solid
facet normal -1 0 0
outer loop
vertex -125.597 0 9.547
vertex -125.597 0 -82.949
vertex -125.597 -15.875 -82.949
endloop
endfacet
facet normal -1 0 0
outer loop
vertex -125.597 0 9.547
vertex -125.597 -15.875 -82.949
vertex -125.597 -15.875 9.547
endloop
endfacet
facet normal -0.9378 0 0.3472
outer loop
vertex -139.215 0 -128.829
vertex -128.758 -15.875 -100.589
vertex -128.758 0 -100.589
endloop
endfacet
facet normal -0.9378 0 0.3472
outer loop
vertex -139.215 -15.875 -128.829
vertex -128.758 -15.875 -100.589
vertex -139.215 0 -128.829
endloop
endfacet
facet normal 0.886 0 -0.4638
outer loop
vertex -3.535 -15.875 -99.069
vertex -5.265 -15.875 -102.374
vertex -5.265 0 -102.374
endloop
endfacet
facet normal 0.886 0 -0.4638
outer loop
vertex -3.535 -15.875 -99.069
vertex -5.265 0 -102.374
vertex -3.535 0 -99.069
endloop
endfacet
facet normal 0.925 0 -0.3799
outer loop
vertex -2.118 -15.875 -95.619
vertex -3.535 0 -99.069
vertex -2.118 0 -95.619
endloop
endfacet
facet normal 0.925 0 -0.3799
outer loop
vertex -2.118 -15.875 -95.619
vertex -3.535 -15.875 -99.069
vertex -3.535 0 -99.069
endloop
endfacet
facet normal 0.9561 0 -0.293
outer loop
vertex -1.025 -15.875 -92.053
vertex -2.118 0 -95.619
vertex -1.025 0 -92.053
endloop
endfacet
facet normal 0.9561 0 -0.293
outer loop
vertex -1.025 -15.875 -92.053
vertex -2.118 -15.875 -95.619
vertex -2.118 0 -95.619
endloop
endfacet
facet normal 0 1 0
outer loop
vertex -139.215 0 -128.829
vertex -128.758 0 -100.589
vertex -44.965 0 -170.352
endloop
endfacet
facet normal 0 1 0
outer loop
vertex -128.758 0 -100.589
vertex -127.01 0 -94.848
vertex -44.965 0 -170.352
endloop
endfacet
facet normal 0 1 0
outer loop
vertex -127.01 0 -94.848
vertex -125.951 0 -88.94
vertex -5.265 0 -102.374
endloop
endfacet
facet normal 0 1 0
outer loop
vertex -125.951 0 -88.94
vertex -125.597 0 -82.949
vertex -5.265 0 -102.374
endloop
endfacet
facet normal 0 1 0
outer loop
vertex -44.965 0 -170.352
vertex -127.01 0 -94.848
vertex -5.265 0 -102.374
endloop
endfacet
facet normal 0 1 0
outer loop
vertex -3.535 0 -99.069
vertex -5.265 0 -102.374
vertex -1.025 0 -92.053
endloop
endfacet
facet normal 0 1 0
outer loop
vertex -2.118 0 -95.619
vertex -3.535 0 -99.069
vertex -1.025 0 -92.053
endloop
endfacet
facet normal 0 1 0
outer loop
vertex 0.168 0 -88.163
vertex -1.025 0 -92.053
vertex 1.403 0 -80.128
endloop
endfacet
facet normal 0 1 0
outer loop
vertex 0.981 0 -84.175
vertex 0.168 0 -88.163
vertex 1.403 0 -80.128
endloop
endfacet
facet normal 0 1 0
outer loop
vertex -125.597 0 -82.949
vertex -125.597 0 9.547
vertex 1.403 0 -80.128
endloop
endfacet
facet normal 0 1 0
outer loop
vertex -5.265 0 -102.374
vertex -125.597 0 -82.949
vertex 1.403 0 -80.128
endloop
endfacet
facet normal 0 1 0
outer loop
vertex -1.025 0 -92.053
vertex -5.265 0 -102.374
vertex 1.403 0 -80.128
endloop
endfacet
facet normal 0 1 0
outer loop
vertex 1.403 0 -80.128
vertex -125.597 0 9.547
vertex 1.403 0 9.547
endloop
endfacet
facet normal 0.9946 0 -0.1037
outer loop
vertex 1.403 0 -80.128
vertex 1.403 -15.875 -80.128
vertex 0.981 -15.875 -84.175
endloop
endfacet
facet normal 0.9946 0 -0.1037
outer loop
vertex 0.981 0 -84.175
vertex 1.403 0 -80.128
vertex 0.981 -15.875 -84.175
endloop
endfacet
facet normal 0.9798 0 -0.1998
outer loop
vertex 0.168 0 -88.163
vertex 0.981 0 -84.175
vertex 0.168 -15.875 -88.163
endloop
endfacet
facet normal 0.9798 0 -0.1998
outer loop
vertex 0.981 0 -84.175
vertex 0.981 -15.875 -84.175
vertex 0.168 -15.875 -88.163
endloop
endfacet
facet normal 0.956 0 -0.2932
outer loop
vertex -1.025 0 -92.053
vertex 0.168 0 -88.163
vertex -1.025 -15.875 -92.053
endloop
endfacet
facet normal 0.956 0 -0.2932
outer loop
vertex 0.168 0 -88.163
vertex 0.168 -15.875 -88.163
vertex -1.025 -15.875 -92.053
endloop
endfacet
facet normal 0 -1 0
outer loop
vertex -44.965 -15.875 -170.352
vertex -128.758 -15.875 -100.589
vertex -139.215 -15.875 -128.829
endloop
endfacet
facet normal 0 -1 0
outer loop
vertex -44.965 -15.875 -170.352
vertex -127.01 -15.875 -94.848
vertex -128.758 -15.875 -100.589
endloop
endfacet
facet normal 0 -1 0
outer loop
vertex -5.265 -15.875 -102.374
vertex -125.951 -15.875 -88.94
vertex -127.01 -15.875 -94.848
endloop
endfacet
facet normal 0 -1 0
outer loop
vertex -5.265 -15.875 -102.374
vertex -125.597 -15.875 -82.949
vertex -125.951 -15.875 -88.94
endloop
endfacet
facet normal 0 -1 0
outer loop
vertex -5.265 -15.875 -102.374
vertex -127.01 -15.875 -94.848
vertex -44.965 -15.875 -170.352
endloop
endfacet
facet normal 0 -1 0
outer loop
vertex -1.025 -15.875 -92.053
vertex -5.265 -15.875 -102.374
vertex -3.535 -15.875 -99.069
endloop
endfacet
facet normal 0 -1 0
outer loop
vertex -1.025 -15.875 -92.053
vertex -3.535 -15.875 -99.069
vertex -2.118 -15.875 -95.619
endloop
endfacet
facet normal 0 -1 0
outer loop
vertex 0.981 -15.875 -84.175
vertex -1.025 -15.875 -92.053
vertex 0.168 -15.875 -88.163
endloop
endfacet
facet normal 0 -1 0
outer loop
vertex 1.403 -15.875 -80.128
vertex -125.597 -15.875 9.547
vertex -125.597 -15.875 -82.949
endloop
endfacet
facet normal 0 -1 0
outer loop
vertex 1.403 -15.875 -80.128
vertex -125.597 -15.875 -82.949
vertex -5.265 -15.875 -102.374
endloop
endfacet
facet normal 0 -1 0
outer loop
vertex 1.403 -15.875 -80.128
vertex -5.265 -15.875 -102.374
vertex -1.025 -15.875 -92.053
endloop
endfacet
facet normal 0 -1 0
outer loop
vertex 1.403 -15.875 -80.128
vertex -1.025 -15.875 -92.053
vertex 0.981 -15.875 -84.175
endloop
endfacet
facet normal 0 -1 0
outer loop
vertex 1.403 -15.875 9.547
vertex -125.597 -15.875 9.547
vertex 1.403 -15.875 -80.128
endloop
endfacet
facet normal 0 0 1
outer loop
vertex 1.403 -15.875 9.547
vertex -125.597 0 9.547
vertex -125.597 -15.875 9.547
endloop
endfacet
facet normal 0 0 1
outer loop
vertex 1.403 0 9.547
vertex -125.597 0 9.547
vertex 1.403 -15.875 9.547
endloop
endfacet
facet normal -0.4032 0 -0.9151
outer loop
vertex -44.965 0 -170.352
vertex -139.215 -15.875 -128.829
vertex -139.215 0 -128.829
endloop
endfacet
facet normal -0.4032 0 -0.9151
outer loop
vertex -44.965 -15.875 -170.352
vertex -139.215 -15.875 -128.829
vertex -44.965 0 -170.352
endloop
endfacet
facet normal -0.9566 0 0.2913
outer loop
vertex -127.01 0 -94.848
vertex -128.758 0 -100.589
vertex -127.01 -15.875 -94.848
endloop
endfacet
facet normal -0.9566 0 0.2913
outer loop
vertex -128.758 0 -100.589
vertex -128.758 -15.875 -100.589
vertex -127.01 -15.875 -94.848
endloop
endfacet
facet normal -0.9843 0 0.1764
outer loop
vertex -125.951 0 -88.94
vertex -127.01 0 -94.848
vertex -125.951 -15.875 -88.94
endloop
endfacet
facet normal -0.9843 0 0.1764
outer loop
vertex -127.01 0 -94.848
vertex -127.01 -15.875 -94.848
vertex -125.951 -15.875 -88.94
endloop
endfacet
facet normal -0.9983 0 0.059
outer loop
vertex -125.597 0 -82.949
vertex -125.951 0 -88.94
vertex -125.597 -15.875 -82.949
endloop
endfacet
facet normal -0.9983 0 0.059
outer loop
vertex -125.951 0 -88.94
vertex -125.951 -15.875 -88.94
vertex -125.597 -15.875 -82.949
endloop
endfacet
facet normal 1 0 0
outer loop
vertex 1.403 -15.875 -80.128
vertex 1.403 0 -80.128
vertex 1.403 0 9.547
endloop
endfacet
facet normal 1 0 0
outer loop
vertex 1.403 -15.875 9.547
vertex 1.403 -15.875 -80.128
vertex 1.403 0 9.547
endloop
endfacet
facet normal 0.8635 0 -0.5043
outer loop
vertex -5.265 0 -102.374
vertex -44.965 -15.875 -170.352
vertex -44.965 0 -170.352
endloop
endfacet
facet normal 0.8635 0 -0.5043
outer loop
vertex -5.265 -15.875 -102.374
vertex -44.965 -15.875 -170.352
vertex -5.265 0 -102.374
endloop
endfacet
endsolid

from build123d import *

# Parameters (mm, degrees)
F0_W     = 127
F0_H     = 101.6
F1_DEPTH = 15.875
F3_DEPTH = 19.05
F5_DEPTH = 15.875
F6_R     = 50.8


with BuildPart() as f1:
    # F0 (on Front) → F1 (new body)
    with BuildSketch(Plane.XZ):
        with Locations((-62.0965630407, -41.252563009)):
            Rectangle(F0_W, F0_H)
    extrude(amount=F1_DEPTH)

    # F2 (on face) → F3 (cut)
    with BuildSketch(Plane.XZ.offset(15.875)):
        with BuildLine():
            Line((-1.0253972141, -92.052563009), (1.4034369593, -92.052563009))
            Line((1.4034369593, -92.052563009), (1.4034369593, -80.1284596617))
            ThreePointArc((1.4034369593, -80.1284596617), (0.6228444874, -86.1788775646), (-1.0253972141, -92.052563009))
        make_face()
        with BuildLine():
            Line((1.4034369593, -75.45119524), (1.4034369593, -80.1284596617))
            ThreePointArc((1.4034369593, -80.1284596617), (1.4685491276, -77.7898274509), (1.4034369593, -75.45119524))
        make_face()
    extrude(amount=-F3_DEPTH, mode=Mode.SUBTRACT)

    # F4 (on face) → F5 (join)
    with BuildSketch(Plane.XZ.offset(15.875)):
        with BuildLine():
            Line((-1.0253972141, -92.052563009), (-125.5965630407, -92.052563009))
            Line((-125.5965630407, -92.052563009), (-139.2145454884, -128.8291364908))
            Line((-139.2145454884, -128.8291364908), (-44.9651107192, -170.3518033028))
            Line((-44.9651107192, -170.3518033028), (-5.2652601153, -102.3738086224))
            ThreePointArc((-5.2652601153, -102.3738086224), (-2.7865893027, -97.3605523032), (-1.0253972141, -92.052563009))
        make_face()
    extrude(amount=-F5_DEPTH)

    # F6
    f6_edges = [f1.edges().sort_by_distance(p)[0] for p in [
        (-125.596563, -7.9375, -92.052563),
    ]]
    fillet(f6_edges, radius=F6_R)


solid = f1.part
